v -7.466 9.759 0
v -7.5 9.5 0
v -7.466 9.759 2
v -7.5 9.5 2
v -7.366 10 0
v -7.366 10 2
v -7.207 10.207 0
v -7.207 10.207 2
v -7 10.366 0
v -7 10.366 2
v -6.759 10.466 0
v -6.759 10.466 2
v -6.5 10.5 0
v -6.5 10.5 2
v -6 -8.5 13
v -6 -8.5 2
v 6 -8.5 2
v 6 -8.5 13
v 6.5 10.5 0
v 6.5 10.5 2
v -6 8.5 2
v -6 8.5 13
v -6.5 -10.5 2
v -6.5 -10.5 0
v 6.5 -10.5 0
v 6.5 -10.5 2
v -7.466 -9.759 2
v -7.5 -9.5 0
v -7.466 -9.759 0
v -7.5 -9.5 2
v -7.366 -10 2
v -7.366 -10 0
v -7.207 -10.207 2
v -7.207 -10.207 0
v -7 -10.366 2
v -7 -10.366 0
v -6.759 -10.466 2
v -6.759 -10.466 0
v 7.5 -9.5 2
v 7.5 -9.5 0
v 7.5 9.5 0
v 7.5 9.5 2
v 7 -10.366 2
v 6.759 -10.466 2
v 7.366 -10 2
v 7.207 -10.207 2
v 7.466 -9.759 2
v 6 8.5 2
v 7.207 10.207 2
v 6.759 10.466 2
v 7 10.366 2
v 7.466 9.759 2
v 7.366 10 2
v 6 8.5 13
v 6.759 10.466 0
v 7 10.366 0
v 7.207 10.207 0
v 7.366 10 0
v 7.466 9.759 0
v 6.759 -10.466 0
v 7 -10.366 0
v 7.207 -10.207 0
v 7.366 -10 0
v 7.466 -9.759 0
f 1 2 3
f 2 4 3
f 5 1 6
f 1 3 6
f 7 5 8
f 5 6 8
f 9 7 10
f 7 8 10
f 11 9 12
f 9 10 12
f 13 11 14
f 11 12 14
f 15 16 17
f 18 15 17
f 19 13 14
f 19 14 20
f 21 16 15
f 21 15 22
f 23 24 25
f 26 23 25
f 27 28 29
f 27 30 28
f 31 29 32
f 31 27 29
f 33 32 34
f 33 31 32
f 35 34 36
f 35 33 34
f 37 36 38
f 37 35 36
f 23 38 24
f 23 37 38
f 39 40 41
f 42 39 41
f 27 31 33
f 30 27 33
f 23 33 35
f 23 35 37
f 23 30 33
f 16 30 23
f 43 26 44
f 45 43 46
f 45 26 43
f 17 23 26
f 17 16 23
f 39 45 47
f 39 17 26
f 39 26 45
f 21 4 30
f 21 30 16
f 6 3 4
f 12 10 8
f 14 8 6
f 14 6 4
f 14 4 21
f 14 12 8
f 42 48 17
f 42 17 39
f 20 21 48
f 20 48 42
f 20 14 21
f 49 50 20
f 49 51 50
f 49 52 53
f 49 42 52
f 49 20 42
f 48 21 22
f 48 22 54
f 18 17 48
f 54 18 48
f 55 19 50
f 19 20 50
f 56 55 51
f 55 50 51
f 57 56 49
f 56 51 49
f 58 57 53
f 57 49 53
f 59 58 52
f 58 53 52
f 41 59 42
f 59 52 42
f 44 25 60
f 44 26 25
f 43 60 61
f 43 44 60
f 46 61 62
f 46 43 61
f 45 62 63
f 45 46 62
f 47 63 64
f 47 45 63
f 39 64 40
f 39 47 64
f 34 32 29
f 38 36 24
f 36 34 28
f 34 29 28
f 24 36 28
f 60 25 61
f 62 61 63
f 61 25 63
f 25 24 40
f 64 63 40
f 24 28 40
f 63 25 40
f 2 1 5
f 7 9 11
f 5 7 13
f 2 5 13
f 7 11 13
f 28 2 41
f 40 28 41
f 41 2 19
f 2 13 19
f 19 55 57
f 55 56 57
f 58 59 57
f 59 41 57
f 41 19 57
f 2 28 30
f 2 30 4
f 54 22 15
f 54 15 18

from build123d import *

# Parameters (mm, degrees)
SKETCH1_W           = 12
SKETCH1_H           = 17
BOSS_EXTRUDE1_DEPTH = 13
SKETCH2_W           = 15
SKETCH2_H           = 21
BOSS_EXTRUDE2_DEPTH = 2
FILLET1_R           = 1


with BuildPart() as part:
    # Sketch1 → Boss-Extrude1 (new body)
    with BuildSketch(Plane.XY):
        Rectangle(SKETCH1_W, SKETCH1_H)
    extrude(amount=BOSS_EXTRUDE1_DEPTH)

    # Sketch2 → Boss-Extrude2 (add)
    with BuildSketch(Plane.XY):
        Rectangle(SKETCH2_W, SKETCH2_H)
    extrude(amount=BOSS_EXTRUDE2_DEPTH)

    # Fillet1
    fillet1_edges = [part.edges().sort_by_distance(p)[0] for p in [
        (-7.5, 10.5, 1),
        (-7.5, -10.5, 1),
        (7.5, -10.5, 1),
        (7.5, 10.5, 1),
    ]]
    fillet(fillet1_edges, radius=FILLET1_R)


solid = part.part
